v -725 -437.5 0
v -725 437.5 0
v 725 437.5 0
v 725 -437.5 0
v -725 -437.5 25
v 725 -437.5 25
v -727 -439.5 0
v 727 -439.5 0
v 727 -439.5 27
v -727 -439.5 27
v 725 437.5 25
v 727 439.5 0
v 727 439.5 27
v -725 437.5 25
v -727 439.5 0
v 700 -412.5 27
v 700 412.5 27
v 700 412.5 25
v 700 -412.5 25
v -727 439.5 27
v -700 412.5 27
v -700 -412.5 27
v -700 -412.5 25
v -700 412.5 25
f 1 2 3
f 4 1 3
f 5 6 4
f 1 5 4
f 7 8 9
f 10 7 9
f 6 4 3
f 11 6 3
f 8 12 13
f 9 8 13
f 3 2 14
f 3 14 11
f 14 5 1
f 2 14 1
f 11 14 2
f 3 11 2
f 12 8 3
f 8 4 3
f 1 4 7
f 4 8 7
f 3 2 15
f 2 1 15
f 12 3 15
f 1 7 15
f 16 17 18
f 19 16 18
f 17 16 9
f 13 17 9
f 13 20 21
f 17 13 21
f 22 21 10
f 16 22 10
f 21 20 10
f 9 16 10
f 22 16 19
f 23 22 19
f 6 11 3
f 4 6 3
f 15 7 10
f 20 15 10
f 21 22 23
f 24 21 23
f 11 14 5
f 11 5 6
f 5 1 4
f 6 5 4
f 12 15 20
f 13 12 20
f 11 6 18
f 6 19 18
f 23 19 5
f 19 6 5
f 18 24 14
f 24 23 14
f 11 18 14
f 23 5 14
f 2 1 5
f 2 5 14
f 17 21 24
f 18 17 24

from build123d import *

# Parameters (mm, degrees)
F0_W     = 1450
F0_H     = 875
F1_DEPTH = 25


with BuildPart() as f1:
    # F0 (on Top) → F1 (new body)
    with BuildSketch(Plane.XY):
        Rectangle(F0_W, F0_H)
    extrude(amount=F1_DEPTH)


with BuildPart() as f3:
    # F3: sweep along a path in F3_path
    with BuildLine(Plane(origin=(725, 437.5, 25), x_dir=(0, -1, 0), z_dir=(0, 0, -1))) as f3_path:
        Line((0, 0), (0, 1450))
        Line((0, 1450), (875, 1450))
        Line((875, 1450), (875, 0))
        Line((875, 0), (0, 0))
    # F2 (on face) → F3 (sweep)
    with BuildSketch(Plane.YZ.offset(725)):
        Polygon((412.5, 27), (412.5, 25), (437.5, 25), (437.5, 0), (439.5, 0), (439.5, 27), align=None)
    sweep(path=f3_path.line, transition=Transition.RIGHT)


solid = Compound([f1.part, f3.part])
